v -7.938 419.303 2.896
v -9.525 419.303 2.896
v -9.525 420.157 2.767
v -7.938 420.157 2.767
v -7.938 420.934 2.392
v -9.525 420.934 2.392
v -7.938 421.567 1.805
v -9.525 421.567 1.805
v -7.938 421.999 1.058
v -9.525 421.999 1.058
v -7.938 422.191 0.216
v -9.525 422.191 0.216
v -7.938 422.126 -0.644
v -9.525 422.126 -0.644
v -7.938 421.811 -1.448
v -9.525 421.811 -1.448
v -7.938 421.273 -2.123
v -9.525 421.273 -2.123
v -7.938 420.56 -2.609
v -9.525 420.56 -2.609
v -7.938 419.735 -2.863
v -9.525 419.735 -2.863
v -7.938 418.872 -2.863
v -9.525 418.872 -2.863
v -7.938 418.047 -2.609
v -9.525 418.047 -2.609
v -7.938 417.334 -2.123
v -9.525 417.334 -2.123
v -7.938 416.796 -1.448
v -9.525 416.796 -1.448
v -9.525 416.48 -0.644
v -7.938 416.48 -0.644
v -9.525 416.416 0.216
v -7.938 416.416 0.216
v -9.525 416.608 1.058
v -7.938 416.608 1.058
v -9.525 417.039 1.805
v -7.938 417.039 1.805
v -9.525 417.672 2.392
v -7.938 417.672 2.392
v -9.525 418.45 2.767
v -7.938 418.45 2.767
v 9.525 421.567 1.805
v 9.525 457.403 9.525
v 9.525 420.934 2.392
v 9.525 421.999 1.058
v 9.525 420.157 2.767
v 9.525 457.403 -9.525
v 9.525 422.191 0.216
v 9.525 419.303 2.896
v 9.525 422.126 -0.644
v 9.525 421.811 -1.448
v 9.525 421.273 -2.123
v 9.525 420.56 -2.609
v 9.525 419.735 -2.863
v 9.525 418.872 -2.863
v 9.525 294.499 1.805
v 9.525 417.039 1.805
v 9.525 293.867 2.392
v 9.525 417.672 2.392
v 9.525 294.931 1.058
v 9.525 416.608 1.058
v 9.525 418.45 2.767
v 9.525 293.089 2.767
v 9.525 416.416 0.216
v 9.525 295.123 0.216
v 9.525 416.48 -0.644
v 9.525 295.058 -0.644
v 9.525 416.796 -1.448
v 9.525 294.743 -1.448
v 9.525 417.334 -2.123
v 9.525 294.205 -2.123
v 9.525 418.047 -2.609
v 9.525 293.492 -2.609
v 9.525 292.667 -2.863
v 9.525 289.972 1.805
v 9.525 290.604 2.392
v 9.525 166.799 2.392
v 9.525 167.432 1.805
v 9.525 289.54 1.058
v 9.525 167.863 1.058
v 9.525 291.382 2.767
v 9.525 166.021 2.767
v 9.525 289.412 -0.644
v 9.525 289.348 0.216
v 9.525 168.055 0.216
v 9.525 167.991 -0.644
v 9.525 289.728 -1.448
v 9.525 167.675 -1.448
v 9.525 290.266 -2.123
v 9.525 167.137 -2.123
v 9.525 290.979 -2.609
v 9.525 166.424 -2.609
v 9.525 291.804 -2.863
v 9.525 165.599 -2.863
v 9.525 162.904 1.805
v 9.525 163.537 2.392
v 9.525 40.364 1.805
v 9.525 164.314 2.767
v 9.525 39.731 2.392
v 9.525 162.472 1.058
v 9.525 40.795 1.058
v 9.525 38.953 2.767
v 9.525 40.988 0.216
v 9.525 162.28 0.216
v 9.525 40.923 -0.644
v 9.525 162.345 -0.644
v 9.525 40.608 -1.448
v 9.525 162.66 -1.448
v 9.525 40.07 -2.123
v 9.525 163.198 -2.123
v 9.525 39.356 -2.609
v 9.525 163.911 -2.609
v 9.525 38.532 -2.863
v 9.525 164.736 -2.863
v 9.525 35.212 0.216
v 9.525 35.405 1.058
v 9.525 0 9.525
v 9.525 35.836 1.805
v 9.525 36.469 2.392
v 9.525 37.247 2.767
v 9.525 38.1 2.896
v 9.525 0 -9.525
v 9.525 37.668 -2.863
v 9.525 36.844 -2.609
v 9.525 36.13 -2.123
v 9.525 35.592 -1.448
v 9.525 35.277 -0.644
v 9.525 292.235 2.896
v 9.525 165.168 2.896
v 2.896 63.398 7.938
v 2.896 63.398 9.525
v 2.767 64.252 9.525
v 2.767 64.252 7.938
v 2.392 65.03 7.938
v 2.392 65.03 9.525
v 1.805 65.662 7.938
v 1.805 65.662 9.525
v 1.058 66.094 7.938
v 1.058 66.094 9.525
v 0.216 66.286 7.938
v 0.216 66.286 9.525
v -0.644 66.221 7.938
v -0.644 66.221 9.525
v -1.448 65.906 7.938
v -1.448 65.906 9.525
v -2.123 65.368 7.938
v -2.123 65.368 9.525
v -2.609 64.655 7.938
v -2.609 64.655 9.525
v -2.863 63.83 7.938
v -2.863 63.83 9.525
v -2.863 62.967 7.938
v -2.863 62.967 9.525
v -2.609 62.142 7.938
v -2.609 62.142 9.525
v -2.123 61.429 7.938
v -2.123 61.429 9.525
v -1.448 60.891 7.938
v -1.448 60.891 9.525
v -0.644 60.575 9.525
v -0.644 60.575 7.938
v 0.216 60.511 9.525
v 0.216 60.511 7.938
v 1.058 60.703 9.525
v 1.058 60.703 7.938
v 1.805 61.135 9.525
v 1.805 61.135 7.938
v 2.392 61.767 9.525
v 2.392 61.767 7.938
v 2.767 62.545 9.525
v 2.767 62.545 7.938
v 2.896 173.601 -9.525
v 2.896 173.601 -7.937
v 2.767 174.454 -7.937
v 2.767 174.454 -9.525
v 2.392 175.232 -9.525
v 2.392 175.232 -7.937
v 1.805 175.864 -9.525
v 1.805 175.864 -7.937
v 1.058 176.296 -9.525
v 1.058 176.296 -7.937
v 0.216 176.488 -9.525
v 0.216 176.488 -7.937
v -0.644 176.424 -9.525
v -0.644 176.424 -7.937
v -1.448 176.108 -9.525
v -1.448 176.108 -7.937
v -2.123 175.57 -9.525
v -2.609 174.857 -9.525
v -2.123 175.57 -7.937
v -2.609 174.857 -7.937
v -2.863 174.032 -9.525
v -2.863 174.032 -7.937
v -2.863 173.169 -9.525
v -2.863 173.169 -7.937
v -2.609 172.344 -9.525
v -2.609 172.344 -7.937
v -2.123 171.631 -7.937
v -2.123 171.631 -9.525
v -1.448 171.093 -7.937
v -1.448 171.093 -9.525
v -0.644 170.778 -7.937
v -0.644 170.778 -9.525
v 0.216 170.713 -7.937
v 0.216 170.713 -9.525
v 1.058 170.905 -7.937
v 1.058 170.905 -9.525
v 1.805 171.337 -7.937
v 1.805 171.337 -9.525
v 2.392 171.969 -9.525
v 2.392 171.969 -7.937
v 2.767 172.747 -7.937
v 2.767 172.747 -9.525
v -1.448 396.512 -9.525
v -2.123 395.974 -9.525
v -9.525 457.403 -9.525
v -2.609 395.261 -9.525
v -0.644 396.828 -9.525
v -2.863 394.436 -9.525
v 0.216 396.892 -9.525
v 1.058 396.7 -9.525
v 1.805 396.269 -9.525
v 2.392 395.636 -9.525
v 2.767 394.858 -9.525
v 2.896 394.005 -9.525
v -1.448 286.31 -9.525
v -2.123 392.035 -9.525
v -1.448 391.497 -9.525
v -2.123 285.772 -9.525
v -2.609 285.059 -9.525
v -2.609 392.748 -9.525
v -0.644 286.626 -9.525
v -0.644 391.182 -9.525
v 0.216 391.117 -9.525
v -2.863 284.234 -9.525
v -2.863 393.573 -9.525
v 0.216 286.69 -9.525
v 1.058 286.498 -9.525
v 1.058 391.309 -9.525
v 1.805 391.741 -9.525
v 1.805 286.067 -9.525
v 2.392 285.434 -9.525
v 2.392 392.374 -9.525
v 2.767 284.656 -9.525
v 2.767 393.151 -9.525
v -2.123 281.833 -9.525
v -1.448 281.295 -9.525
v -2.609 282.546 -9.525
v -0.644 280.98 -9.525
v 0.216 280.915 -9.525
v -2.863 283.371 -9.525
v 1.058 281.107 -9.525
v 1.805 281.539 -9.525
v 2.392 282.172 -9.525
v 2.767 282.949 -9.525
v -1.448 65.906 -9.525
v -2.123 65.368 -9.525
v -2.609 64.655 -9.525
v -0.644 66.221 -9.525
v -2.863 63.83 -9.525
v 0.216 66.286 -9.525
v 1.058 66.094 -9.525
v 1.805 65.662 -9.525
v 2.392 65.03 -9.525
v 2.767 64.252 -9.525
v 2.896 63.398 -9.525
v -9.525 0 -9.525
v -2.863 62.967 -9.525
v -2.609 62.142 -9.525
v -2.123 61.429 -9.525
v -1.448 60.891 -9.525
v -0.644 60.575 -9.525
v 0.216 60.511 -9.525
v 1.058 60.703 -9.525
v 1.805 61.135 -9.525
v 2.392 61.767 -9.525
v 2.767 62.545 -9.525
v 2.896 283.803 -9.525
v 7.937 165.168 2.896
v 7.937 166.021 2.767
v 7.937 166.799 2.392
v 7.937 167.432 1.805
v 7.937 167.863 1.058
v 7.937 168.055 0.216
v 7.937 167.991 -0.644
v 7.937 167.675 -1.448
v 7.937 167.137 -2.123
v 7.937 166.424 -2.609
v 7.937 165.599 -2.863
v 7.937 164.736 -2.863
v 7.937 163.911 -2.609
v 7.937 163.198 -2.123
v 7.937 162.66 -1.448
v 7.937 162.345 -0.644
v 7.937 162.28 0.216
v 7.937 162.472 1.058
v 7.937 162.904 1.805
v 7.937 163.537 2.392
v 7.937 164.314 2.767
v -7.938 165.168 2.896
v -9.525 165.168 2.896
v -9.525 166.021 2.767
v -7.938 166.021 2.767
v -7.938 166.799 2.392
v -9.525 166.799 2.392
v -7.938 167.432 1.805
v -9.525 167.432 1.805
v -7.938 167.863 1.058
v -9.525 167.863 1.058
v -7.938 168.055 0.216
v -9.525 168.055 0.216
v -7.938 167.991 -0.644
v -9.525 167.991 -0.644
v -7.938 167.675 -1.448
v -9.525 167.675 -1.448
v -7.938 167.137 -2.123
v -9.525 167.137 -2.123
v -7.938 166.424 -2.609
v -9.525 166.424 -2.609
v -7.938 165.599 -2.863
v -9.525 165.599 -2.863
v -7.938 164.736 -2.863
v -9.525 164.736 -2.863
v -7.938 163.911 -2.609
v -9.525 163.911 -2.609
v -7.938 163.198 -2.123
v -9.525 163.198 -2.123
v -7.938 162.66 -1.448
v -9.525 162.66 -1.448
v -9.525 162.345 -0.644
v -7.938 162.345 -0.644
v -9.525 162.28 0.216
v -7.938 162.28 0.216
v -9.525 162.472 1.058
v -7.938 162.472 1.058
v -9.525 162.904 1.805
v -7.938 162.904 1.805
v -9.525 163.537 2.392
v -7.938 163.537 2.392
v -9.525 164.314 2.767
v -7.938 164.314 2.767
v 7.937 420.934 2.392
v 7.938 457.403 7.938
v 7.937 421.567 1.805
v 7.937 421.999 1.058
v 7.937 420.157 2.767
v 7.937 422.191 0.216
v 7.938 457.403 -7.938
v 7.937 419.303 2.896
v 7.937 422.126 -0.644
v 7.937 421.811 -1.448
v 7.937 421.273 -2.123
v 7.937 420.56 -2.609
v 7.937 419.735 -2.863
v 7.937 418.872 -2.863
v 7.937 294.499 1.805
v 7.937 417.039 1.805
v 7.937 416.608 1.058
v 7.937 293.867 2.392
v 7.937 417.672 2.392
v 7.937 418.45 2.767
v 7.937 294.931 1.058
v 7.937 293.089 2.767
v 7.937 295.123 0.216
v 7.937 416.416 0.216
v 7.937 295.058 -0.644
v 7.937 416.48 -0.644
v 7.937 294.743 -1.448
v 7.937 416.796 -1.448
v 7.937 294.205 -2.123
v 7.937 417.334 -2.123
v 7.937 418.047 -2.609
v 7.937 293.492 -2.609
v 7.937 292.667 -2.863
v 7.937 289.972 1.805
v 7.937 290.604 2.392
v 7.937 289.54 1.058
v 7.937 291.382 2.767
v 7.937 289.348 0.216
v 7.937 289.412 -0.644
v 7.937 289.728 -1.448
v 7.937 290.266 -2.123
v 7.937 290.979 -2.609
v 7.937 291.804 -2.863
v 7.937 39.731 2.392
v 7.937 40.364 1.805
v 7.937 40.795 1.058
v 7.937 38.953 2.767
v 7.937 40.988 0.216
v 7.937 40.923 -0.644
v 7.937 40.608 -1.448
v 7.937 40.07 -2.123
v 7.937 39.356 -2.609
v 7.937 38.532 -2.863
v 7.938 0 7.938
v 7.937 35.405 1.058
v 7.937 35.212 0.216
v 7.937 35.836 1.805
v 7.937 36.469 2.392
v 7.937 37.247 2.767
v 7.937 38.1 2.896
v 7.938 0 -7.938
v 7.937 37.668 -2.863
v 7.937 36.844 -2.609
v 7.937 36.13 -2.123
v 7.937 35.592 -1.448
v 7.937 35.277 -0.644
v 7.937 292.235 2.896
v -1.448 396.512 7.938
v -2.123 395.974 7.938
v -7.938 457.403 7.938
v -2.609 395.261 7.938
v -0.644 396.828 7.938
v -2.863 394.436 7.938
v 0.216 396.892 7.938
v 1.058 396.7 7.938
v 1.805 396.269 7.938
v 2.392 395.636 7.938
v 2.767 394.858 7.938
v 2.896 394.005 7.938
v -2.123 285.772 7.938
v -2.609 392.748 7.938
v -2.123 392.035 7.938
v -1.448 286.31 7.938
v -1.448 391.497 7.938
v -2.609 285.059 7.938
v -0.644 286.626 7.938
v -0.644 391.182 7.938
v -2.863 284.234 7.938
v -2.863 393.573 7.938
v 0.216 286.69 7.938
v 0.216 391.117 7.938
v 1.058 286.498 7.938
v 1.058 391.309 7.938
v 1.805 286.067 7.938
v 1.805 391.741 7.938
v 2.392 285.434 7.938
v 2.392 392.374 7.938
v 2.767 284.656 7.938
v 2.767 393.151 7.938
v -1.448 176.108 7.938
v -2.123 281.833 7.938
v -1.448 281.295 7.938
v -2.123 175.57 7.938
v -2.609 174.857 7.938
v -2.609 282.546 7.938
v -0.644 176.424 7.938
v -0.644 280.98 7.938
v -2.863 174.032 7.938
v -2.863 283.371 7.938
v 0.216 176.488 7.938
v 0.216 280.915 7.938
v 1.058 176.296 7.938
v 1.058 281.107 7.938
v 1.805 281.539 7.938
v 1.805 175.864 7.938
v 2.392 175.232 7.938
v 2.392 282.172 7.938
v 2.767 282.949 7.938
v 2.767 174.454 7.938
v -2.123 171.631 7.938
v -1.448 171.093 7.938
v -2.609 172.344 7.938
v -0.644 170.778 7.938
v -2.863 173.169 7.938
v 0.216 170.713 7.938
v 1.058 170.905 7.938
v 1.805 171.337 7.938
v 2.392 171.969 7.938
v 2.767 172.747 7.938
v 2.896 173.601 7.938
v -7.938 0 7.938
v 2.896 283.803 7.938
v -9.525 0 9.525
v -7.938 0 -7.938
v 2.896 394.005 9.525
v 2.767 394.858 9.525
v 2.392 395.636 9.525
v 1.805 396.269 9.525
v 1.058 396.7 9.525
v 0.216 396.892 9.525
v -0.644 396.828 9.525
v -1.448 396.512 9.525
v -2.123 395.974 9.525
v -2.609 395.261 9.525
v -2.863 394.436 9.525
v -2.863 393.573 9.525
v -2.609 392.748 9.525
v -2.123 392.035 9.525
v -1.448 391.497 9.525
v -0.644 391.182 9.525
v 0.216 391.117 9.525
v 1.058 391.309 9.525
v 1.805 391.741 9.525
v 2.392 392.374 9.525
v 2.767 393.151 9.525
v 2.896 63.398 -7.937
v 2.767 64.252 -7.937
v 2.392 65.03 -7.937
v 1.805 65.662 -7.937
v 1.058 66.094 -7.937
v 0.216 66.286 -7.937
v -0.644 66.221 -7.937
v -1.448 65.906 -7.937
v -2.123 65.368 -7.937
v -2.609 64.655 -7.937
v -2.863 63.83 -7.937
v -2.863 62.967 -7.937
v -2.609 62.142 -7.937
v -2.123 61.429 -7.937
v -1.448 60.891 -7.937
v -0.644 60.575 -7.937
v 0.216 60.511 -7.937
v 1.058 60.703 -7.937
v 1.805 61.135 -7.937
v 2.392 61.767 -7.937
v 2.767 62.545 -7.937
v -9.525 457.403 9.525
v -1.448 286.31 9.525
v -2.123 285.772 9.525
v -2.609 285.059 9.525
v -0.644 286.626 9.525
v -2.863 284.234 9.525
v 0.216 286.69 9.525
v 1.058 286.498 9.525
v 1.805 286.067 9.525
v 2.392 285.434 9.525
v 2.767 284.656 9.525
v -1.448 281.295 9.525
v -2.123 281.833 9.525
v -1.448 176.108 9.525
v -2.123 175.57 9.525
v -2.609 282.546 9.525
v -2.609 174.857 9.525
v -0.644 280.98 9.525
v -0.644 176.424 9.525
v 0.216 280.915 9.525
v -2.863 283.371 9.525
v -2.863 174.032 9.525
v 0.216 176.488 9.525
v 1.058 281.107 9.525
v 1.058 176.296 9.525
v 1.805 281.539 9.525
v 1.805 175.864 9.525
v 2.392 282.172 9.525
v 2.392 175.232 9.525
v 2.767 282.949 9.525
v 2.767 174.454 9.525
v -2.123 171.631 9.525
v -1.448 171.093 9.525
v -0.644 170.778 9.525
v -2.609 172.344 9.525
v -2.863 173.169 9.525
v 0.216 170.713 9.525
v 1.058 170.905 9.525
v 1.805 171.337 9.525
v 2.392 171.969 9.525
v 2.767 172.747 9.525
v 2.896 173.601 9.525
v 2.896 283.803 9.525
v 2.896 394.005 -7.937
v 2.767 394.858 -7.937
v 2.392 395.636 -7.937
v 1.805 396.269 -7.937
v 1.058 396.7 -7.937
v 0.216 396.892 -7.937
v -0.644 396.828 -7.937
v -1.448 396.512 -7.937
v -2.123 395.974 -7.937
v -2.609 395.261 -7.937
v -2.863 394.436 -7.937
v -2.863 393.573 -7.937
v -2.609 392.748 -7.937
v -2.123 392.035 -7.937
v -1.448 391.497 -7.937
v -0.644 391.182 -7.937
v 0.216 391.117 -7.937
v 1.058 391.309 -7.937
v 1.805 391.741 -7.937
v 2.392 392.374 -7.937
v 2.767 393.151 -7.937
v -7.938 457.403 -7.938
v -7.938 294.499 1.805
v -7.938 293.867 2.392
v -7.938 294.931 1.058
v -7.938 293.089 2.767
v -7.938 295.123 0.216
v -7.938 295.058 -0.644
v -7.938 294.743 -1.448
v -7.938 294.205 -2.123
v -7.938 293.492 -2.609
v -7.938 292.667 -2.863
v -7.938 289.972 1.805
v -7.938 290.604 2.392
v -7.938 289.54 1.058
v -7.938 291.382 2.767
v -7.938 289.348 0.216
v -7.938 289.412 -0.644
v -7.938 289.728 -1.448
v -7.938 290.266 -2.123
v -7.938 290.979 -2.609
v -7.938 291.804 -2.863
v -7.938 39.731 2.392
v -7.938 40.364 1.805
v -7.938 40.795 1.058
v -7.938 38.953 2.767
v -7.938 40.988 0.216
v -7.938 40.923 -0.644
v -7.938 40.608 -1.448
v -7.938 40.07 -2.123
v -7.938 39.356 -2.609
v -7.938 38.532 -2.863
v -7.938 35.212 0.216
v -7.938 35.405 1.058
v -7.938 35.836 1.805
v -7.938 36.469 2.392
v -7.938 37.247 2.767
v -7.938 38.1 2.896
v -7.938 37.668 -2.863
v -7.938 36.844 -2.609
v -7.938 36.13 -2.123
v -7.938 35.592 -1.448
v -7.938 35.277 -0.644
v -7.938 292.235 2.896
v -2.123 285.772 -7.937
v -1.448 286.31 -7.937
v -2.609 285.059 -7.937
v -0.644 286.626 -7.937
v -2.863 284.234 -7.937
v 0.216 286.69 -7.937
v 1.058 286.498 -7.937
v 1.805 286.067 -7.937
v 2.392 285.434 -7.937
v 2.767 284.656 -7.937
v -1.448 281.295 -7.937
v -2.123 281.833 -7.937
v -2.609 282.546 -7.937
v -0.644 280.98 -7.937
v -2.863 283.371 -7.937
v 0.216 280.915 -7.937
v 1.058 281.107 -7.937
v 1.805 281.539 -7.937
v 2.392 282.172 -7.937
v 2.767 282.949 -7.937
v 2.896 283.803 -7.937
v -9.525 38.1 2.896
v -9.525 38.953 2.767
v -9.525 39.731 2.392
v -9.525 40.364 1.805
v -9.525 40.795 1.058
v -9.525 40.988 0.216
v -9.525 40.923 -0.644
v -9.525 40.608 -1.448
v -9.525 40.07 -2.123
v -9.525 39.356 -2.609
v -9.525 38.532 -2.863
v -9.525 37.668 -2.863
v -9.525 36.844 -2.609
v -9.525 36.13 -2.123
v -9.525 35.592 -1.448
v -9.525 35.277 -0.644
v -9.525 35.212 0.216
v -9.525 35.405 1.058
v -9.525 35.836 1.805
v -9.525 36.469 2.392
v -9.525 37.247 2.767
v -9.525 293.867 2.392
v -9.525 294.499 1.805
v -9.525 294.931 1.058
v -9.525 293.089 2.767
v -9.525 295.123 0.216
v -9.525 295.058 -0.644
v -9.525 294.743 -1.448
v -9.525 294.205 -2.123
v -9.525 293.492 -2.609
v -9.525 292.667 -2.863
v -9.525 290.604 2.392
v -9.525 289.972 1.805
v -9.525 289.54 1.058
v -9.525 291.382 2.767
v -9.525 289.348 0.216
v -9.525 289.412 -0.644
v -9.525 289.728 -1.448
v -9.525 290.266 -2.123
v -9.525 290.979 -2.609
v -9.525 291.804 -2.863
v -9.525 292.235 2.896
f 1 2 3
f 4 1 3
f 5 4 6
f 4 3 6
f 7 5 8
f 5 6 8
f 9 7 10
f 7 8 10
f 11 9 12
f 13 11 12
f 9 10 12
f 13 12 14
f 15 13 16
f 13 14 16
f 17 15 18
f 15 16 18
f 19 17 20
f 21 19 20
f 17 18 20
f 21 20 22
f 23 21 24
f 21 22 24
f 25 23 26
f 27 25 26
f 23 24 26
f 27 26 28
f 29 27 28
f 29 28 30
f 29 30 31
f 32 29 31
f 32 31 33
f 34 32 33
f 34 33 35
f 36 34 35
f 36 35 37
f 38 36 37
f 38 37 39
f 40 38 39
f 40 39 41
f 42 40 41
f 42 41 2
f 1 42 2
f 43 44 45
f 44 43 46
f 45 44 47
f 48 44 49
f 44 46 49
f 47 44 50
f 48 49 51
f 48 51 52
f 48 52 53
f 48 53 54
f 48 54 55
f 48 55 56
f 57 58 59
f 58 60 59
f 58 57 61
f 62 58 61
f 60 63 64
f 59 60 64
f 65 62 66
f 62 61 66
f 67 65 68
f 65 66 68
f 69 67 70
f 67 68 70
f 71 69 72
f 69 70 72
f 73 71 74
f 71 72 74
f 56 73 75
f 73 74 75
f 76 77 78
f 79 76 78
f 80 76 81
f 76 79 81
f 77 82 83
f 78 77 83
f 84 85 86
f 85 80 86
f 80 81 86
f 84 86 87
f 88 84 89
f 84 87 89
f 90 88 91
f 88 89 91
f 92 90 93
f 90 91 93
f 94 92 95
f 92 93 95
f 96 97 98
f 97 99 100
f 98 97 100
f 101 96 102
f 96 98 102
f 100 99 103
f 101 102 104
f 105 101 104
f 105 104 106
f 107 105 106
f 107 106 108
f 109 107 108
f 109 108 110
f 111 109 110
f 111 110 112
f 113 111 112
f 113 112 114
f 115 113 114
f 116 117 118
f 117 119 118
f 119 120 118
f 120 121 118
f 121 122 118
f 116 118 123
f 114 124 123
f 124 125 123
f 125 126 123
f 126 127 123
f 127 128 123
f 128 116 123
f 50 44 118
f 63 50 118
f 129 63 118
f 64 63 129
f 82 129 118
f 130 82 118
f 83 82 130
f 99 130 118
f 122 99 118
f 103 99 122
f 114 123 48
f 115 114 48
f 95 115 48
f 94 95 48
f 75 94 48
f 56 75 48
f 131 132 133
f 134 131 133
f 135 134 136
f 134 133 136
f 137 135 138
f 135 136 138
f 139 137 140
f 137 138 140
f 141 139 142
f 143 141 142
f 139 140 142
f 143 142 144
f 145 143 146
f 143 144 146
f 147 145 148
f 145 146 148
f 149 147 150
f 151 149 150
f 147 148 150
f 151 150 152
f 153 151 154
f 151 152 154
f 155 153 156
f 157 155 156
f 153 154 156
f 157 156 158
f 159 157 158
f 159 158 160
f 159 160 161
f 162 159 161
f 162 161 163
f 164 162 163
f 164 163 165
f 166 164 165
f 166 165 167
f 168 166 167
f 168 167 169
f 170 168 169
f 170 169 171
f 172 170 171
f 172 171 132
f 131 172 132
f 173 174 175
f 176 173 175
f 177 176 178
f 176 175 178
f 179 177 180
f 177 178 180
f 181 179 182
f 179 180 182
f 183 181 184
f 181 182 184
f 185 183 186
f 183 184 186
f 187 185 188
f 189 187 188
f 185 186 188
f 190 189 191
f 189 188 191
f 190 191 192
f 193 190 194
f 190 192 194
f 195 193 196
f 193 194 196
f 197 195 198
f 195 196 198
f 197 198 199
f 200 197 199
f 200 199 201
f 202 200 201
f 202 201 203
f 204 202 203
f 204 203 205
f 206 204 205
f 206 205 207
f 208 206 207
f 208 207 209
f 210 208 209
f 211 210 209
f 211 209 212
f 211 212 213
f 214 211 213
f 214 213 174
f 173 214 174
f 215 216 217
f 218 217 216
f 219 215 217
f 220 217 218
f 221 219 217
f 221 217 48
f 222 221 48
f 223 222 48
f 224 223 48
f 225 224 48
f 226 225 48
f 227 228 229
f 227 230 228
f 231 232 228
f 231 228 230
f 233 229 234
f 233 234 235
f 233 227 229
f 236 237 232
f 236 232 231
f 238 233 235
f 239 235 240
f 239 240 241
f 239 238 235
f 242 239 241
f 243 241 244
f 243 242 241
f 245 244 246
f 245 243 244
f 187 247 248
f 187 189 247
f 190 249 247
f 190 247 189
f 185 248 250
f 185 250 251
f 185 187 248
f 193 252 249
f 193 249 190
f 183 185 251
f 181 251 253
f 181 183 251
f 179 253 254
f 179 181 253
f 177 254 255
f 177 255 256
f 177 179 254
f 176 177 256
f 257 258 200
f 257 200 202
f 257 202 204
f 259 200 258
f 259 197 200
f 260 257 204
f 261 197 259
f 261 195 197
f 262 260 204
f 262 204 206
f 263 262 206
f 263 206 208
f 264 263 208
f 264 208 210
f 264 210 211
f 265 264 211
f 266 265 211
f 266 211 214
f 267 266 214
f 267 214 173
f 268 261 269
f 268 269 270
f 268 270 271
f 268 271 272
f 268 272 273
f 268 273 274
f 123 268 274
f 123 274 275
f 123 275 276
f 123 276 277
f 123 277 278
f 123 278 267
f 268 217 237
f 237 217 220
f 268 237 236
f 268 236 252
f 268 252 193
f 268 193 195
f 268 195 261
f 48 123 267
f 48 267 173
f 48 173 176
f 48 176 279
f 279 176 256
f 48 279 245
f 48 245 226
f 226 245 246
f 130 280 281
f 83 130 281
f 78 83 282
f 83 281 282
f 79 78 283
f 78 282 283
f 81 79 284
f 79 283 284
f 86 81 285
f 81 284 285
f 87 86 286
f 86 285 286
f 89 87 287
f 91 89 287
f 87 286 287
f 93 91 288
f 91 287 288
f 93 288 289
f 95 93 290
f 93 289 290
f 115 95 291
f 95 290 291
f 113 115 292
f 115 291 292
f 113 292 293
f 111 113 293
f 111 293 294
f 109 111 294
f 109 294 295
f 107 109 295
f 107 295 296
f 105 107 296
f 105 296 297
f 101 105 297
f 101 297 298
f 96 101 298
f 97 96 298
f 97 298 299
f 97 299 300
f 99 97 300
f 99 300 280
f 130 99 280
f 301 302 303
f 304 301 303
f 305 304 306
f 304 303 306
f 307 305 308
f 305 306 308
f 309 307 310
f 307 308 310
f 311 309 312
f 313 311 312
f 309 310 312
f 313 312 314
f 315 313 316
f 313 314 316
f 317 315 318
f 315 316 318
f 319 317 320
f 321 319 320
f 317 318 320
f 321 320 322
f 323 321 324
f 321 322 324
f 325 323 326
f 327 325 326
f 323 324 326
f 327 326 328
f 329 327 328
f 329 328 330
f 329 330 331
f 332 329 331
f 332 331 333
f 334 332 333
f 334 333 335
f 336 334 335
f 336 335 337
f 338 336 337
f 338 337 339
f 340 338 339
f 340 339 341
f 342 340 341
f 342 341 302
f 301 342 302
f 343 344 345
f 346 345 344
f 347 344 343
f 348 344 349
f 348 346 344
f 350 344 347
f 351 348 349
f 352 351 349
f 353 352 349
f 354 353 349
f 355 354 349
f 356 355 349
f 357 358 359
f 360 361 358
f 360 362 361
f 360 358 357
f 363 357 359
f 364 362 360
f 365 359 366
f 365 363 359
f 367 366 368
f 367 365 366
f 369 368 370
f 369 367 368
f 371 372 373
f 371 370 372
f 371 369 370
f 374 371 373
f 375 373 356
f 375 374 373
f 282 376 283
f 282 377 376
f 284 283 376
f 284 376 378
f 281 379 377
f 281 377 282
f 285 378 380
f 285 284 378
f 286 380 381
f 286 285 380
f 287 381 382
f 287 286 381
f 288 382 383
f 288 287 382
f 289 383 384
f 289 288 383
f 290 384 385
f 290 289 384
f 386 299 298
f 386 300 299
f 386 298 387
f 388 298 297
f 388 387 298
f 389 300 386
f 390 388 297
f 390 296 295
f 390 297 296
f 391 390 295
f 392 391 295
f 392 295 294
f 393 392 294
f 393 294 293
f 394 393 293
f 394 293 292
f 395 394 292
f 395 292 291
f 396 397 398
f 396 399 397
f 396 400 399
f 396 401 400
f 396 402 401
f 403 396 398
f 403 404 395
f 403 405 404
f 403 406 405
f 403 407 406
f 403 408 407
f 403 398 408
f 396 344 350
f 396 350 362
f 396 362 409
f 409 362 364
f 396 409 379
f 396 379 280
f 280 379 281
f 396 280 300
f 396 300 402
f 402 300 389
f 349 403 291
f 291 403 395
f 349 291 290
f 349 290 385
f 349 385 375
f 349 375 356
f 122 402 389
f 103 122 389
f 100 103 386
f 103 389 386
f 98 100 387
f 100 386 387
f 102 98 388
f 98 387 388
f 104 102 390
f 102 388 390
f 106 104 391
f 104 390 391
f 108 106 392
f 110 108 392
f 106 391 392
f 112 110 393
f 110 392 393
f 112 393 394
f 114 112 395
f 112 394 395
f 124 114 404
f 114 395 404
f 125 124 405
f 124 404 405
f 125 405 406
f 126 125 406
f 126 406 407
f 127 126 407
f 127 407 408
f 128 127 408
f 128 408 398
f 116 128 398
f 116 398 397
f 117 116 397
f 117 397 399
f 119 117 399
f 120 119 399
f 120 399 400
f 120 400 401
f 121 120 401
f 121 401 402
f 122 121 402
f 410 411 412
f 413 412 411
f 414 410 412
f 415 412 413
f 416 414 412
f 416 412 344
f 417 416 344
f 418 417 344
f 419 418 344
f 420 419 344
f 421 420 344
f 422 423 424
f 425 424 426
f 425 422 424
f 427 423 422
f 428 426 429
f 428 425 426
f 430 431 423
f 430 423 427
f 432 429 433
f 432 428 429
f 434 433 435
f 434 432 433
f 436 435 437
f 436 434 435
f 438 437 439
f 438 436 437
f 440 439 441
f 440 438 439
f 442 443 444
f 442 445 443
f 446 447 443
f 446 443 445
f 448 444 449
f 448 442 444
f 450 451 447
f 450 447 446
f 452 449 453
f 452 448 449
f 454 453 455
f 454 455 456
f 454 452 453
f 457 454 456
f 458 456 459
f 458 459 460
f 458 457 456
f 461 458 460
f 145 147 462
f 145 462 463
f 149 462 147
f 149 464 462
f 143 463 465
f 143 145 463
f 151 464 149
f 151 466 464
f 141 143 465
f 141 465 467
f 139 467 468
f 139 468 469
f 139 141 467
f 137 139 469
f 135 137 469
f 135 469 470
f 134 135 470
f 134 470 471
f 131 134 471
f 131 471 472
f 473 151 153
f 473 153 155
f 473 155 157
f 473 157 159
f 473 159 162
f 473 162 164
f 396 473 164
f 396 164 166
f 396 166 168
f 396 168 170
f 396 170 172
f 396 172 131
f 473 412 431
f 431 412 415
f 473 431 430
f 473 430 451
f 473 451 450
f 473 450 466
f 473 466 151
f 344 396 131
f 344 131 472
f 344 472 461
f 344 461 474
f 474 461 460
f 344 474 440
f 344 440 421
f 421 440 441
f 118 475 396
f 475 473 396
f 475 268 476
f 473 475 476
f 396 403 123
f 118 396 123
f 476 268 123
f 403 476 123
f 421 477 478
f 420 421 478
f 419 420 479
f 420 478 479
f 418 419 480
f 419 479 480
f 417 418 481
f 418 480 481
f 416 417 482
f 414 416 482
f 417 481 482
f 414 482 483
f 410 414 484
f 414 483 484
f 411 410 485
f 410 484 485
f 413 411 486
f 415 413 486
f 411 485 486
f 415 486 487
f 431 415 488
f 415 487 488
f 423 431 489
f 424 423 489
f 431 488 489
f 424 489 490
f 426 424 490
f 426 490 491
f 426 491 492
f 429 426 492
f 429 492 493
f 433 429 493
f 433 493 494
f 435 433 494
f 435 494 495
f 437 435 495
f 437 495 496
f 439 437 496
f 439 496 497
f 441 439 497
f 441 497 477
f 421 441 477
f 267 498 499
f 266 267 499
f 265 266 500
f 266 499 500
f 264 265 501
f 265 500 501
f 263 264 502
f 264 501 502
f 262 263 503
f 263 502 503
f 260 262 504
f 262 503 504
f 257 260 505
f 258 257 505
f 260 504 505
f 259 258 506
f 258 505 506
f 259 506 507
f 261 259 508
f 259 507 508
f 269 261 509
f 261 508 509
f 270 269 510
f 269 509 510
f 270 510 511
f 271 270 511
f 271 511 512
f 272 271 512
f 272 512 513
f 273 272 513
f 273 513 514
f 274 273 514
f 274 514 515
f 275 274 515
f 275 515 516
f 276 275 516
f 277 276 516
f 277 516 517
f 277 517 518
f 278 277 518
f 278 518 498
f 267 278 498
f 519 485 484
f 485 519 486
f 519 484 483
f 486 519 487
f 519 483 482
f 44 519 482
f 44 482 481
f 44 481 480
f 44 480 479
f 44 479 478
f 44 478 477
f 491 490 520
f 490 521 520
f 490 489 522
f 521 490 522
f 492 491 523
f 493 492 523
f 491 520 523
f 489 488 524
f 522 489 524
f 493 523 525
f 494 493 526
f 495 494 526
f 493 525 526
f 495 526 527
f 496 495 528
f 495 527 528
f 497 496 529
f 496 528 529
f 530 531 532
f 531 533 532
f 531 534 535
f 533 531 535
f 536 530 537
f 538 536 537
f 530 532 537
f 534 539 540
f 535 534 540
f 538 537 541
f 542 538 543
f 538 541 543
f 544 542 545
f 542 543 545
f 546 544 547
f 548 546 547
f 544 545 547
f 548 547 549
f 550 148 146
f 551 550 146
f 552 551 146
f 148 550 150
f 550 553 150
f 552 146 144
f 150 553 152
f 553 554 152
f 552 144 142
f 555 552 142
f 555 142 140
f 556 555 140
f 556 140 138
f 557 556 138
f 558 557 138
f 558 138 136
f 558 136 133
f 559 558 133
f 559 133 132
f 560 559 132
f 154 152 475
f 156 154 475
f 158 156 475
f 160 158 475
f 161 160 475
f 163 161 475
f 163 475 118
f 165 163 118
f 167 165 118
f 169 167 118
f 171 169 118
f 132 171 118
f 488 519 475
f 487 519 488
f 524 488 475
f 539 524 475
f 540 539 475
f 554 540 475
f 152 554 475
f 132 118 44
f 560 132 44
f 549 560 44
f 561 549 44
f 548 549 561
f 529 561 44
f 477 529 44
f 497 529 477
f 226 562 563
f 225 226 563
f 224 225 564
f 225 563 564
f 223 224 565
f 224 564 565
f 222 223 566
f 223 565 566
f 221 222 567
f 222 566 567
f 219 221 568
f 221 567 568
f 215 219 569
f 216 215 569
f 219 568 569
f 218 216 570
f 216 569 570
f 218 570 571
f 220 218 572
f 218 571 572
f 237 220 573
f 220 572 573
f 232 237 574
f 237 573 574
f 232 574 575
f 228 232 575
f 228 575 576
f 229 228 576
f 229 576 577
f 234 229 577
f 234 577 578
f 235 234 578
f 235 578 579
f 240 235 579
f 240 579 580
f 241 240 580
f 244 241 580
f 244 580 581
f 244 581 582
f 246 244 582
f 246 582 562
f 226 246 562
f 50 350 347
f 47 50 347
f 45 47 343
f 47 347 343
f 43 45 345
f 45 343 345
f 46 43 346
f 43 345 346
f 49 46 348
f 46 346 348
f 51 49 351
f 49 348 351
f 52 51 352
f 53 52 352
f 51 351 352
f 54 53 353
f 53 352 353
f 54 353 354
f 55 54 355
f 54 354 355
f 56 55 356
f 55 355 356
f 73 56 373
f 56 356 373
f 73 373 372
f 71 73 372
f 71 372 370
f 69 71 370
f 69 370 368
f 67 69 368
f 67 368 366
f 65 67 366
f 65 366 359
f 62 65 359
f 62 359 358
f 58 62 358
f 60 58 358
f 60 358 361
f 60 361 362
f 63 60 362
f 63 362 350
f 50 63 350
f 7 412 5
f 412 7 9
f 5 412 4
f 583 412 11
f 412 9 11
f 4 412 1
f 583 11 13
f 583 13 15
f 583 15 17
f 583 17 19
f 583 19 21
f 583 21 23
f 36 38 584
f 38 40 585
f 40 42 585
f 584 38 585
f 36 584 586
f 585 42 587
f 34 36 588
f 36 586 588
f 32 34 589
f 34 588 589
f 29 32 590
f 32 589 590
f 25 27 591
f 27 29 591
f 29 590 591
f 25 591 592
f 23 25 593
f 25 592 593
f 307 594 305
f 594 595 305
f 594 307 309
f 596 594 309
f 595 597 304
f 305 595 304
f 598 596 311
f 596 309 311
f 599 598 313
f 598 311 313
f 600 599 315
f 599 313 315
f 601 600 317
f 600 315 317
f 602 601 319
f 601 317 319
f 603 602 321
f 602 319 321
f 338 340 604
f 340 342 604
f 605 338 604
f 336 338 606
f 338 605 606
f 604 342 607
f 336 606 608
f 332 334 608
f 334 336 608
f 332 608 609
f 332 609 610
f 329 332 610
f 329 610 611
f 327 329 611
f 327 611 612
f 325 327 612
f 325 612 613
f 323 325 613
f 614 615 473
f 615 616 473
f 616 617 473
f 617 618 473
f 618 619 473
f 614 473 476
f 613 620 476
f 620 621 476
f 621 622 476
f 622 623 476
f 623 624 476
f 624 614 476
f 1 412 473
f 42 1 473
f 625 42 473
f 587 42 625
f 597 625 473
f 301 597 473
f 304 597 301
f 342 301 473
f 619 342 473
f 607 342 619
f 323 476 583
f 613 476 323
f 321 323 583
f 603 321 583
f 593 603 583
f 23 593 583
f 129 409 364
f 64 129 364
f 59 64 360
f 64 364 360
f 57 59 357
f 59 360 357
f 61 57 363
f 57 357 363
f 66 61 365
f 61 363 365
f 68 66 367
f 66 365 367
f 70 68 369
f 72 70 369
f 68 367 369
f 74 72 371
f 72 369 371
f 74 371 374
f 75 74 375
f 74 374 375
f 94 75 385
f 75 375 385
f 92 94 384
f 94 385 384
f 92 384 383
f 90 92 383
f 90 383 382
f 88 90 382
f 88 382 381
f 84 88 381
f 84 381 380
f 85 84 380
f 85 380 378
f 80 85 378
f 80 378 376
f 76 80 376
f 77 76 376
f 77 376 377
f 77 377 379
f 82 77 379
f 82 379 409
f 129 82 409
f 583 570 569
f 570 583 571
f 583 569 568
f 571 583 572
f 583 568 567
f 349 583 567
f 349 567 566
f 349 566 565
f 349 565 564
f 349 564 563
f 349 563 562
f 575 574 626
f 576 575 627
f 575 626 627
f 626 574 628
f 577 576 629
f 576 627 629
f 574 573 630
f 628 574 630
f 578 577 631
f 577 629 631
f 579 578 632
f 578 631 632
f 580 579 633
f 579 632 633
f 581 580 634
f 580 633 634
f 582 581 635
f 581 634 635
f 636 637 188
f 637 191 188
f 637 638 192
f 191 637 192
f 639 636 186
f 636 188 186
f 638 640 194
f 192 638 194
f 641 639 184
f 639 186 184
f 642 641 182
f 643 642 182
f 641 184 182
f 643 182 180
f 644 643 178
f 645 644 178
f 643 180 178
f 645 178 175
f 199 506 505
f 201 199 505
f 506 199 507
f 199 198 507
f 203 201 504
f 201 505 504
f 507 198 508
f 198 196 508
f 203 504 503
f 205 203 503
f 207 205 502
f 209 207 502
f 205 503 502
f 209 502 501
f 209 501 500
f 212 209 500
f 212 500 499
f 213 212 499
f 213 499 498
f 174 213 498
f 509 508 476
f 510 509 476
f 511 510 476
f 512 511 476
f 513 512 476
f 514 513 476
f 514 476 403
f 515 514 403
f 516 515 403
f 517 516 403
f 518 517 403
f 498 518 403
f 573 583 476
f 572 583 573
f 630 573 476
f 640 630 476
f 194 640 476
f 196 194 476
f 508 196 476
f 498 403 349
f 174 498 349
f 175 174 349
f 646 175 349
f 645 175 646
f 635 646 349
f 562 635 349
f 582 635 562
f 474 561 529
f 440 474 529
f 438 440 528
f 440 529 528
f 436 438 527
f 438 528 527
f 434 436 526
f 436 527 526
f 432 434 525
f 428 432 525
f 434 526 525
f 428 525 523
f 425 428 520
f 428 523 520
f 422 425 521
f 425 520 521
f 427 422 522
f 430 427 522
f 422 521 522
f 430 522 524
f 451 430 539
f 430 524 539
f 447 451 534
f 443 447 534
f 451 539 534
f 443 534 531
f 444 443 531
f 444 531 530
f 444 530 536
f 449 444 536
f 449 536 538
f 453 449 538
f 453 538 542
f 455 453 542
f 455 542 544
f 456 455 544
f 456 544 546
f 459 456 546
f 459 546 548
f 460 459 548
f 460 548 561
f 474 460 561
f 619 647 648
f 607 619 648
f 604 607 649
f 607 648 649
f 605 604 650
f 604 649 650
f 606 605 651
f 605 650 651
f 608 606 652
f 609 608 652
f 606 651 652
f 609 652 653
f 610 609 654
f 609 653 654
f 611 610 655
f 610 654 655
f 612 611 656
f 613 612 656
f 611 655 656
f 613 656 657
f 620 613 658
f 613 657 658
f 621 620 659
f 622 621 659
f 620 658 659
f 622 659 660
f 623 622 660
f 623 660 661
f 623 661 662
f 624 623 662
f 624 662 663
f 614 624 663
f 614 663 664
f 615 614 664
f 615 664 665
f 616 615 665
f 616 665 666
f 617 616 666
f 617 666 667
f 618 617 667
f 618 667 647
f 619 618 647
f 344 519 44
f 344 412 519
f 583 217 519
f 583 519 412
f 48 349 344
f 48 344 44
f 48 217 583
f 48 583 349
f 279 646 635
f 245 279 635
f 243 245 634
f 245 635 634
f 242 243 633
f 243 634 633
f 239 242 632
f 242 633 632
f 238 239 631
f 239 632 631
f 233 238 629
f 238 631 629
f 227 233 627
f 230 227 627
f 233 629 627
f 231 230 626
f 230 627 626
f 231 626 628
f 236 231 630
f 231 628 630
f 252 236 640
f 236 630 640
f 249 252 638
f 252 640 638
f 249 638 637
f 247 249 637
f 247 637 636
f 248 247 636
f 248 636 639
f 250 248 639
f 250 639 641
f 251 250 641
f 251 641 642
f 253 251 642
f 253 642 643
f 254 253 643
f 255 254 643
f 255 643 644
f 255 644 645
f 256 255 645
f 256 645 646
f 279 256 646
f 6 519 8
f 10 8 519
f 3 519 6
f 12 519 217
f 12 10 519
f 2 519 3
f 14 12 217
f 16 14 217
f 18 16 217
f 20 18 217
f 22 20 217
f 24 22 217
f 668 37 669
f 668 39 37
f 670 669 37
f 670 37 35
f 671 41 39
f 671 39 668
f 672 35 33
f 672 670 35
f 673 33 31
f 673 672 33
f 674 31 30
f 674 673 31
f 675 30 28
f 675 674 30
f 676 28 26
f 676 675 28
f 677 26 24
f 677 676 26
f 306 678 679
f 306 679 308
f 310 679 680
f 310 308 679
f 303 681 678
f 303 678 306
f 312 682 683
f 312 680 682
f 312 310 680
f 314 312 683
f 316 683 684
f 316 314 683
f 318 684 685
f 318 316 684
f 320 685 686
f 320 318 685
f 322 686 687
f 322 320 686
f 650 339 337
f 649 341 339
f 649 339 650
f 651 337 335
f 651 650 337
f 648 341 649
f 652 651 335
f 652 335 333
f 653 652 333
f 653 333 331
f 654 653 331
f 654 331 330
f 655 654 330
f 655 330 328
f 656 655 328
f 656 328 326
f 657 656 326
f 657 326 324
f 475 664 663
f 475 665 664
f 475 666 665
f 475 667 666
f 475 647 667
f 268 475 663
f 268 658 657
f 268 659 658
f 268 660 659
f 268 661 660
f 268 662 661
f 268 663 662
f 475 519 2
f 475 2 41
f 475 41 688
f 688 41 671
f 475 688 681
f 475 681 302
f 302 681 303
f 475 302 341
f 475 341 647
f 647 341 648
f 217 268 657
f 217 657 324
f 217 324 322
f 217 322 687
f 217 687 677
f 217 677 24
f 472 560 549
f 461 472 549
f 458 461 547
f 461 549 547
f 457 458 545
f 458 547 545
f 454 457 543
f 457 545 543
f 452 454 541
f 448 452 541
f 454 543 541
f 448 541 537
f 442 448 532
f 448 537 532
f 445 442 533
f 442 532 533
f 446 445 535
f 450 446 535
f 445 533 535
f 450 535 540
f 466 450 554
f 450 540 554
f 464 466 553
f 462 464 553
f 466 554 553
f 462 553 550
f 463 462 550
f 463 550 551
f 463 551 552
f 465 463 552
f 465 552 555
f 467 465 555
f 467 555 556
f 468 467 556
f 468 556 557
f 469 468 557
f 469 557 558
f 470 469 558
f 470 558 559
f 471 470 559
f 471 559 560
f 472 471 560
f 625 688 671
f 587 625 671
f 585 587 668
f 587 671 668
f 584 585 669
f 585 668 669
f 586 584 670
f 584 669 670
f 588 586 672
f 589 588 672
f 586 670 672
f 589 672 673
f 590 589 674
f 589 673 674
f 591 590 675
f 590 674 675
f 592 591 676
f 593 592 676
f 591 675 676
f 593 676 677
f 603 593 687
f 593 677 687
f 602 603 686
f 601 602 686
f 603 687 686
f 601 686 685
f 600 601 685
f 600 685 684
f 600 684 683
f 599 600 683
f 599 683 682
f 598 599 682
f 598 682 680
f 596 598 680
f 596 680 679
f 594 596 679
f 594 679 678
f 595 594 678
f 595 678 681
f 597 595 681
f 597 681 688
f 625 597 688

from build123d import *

# Parameters (mm, degrees)
SKETCH1_W                 = 19.05
SKETCH1_H                 = 19.05
SKETCH1_W_2               = 15.875
SKETCH1_H_2               = 15.875
TUBE_DEPTH                = 457.4032
SKETCH2_R                 = 2.8956
TOPPLATEHOLES_DEPTH       = 20.05
LPATTERN1_COUNT           = 4
LPATTERN1_PITCH           = 110.202133333
SKETCH3_R                 = 2.8956
SIDEPLATEHOLEMASTER_DEPTH = 20.05
LPATTERN2_COUNT           = 4
LPATTERN2_PITCH           = 127.067733333


with BuildPart() as part:
    # Sketch1 → Tube (new body)
    with BuildSketch(Plane(origin=(0, 0, 0), x_dir=(1, 0, 0), z_dir=(0, 1, 0))):
        Rectangle(SKETCH1_W, SKETCH1_H)
        Rectangle(SKETCH1_W_2, SKETCH1_H_2, mode=Mode.SUBTRACT)
    extrude(amount=TUBE_DEPTH)

    # Sketch2 → TopPlateHoles (cut, through all)
    with BuildSketch(Plane.XY.offset(9.525)):
        with Locations((0, 394.0048)):
            Circle(SKETCH2_R)
    topplateholes = extrude(amount=-TOPPLATEHOLES_DEPTH, mode=Mode.SUBTRACT)

    # LPattern1: TopPlateHoles ×4
    with Locations(*[(0, -i * LPATTERN1_PITCH, 0) for i in range(1, LPATTERN1_COUNT)]):
        add(topplateholes, mode=Mode.SUBTRACT)

    # Sketch3 → SidePlateHoleMaster (cut, through all)
    with BuildSketch(Plane.ZY.offset(9.525)):
        with Locations((0, 419.3032)):
            Circle(SKETCH3_R)
    sideplateholemaster = extrude(amount=-SIDEPLATEHOLEMASTER_DEPTH, mode=Mode.SUBTRACT)

    # LPattern2: SidePlateHoleMaster ×4
    with Locations(*[(0, -i * LPATTERN2_PITCH, 0) for i in range(1, LPATTERN2_COUNT)]):
        add(sideplateholemaster, mode=Mode.SUBTRACT)


solid = part.part
